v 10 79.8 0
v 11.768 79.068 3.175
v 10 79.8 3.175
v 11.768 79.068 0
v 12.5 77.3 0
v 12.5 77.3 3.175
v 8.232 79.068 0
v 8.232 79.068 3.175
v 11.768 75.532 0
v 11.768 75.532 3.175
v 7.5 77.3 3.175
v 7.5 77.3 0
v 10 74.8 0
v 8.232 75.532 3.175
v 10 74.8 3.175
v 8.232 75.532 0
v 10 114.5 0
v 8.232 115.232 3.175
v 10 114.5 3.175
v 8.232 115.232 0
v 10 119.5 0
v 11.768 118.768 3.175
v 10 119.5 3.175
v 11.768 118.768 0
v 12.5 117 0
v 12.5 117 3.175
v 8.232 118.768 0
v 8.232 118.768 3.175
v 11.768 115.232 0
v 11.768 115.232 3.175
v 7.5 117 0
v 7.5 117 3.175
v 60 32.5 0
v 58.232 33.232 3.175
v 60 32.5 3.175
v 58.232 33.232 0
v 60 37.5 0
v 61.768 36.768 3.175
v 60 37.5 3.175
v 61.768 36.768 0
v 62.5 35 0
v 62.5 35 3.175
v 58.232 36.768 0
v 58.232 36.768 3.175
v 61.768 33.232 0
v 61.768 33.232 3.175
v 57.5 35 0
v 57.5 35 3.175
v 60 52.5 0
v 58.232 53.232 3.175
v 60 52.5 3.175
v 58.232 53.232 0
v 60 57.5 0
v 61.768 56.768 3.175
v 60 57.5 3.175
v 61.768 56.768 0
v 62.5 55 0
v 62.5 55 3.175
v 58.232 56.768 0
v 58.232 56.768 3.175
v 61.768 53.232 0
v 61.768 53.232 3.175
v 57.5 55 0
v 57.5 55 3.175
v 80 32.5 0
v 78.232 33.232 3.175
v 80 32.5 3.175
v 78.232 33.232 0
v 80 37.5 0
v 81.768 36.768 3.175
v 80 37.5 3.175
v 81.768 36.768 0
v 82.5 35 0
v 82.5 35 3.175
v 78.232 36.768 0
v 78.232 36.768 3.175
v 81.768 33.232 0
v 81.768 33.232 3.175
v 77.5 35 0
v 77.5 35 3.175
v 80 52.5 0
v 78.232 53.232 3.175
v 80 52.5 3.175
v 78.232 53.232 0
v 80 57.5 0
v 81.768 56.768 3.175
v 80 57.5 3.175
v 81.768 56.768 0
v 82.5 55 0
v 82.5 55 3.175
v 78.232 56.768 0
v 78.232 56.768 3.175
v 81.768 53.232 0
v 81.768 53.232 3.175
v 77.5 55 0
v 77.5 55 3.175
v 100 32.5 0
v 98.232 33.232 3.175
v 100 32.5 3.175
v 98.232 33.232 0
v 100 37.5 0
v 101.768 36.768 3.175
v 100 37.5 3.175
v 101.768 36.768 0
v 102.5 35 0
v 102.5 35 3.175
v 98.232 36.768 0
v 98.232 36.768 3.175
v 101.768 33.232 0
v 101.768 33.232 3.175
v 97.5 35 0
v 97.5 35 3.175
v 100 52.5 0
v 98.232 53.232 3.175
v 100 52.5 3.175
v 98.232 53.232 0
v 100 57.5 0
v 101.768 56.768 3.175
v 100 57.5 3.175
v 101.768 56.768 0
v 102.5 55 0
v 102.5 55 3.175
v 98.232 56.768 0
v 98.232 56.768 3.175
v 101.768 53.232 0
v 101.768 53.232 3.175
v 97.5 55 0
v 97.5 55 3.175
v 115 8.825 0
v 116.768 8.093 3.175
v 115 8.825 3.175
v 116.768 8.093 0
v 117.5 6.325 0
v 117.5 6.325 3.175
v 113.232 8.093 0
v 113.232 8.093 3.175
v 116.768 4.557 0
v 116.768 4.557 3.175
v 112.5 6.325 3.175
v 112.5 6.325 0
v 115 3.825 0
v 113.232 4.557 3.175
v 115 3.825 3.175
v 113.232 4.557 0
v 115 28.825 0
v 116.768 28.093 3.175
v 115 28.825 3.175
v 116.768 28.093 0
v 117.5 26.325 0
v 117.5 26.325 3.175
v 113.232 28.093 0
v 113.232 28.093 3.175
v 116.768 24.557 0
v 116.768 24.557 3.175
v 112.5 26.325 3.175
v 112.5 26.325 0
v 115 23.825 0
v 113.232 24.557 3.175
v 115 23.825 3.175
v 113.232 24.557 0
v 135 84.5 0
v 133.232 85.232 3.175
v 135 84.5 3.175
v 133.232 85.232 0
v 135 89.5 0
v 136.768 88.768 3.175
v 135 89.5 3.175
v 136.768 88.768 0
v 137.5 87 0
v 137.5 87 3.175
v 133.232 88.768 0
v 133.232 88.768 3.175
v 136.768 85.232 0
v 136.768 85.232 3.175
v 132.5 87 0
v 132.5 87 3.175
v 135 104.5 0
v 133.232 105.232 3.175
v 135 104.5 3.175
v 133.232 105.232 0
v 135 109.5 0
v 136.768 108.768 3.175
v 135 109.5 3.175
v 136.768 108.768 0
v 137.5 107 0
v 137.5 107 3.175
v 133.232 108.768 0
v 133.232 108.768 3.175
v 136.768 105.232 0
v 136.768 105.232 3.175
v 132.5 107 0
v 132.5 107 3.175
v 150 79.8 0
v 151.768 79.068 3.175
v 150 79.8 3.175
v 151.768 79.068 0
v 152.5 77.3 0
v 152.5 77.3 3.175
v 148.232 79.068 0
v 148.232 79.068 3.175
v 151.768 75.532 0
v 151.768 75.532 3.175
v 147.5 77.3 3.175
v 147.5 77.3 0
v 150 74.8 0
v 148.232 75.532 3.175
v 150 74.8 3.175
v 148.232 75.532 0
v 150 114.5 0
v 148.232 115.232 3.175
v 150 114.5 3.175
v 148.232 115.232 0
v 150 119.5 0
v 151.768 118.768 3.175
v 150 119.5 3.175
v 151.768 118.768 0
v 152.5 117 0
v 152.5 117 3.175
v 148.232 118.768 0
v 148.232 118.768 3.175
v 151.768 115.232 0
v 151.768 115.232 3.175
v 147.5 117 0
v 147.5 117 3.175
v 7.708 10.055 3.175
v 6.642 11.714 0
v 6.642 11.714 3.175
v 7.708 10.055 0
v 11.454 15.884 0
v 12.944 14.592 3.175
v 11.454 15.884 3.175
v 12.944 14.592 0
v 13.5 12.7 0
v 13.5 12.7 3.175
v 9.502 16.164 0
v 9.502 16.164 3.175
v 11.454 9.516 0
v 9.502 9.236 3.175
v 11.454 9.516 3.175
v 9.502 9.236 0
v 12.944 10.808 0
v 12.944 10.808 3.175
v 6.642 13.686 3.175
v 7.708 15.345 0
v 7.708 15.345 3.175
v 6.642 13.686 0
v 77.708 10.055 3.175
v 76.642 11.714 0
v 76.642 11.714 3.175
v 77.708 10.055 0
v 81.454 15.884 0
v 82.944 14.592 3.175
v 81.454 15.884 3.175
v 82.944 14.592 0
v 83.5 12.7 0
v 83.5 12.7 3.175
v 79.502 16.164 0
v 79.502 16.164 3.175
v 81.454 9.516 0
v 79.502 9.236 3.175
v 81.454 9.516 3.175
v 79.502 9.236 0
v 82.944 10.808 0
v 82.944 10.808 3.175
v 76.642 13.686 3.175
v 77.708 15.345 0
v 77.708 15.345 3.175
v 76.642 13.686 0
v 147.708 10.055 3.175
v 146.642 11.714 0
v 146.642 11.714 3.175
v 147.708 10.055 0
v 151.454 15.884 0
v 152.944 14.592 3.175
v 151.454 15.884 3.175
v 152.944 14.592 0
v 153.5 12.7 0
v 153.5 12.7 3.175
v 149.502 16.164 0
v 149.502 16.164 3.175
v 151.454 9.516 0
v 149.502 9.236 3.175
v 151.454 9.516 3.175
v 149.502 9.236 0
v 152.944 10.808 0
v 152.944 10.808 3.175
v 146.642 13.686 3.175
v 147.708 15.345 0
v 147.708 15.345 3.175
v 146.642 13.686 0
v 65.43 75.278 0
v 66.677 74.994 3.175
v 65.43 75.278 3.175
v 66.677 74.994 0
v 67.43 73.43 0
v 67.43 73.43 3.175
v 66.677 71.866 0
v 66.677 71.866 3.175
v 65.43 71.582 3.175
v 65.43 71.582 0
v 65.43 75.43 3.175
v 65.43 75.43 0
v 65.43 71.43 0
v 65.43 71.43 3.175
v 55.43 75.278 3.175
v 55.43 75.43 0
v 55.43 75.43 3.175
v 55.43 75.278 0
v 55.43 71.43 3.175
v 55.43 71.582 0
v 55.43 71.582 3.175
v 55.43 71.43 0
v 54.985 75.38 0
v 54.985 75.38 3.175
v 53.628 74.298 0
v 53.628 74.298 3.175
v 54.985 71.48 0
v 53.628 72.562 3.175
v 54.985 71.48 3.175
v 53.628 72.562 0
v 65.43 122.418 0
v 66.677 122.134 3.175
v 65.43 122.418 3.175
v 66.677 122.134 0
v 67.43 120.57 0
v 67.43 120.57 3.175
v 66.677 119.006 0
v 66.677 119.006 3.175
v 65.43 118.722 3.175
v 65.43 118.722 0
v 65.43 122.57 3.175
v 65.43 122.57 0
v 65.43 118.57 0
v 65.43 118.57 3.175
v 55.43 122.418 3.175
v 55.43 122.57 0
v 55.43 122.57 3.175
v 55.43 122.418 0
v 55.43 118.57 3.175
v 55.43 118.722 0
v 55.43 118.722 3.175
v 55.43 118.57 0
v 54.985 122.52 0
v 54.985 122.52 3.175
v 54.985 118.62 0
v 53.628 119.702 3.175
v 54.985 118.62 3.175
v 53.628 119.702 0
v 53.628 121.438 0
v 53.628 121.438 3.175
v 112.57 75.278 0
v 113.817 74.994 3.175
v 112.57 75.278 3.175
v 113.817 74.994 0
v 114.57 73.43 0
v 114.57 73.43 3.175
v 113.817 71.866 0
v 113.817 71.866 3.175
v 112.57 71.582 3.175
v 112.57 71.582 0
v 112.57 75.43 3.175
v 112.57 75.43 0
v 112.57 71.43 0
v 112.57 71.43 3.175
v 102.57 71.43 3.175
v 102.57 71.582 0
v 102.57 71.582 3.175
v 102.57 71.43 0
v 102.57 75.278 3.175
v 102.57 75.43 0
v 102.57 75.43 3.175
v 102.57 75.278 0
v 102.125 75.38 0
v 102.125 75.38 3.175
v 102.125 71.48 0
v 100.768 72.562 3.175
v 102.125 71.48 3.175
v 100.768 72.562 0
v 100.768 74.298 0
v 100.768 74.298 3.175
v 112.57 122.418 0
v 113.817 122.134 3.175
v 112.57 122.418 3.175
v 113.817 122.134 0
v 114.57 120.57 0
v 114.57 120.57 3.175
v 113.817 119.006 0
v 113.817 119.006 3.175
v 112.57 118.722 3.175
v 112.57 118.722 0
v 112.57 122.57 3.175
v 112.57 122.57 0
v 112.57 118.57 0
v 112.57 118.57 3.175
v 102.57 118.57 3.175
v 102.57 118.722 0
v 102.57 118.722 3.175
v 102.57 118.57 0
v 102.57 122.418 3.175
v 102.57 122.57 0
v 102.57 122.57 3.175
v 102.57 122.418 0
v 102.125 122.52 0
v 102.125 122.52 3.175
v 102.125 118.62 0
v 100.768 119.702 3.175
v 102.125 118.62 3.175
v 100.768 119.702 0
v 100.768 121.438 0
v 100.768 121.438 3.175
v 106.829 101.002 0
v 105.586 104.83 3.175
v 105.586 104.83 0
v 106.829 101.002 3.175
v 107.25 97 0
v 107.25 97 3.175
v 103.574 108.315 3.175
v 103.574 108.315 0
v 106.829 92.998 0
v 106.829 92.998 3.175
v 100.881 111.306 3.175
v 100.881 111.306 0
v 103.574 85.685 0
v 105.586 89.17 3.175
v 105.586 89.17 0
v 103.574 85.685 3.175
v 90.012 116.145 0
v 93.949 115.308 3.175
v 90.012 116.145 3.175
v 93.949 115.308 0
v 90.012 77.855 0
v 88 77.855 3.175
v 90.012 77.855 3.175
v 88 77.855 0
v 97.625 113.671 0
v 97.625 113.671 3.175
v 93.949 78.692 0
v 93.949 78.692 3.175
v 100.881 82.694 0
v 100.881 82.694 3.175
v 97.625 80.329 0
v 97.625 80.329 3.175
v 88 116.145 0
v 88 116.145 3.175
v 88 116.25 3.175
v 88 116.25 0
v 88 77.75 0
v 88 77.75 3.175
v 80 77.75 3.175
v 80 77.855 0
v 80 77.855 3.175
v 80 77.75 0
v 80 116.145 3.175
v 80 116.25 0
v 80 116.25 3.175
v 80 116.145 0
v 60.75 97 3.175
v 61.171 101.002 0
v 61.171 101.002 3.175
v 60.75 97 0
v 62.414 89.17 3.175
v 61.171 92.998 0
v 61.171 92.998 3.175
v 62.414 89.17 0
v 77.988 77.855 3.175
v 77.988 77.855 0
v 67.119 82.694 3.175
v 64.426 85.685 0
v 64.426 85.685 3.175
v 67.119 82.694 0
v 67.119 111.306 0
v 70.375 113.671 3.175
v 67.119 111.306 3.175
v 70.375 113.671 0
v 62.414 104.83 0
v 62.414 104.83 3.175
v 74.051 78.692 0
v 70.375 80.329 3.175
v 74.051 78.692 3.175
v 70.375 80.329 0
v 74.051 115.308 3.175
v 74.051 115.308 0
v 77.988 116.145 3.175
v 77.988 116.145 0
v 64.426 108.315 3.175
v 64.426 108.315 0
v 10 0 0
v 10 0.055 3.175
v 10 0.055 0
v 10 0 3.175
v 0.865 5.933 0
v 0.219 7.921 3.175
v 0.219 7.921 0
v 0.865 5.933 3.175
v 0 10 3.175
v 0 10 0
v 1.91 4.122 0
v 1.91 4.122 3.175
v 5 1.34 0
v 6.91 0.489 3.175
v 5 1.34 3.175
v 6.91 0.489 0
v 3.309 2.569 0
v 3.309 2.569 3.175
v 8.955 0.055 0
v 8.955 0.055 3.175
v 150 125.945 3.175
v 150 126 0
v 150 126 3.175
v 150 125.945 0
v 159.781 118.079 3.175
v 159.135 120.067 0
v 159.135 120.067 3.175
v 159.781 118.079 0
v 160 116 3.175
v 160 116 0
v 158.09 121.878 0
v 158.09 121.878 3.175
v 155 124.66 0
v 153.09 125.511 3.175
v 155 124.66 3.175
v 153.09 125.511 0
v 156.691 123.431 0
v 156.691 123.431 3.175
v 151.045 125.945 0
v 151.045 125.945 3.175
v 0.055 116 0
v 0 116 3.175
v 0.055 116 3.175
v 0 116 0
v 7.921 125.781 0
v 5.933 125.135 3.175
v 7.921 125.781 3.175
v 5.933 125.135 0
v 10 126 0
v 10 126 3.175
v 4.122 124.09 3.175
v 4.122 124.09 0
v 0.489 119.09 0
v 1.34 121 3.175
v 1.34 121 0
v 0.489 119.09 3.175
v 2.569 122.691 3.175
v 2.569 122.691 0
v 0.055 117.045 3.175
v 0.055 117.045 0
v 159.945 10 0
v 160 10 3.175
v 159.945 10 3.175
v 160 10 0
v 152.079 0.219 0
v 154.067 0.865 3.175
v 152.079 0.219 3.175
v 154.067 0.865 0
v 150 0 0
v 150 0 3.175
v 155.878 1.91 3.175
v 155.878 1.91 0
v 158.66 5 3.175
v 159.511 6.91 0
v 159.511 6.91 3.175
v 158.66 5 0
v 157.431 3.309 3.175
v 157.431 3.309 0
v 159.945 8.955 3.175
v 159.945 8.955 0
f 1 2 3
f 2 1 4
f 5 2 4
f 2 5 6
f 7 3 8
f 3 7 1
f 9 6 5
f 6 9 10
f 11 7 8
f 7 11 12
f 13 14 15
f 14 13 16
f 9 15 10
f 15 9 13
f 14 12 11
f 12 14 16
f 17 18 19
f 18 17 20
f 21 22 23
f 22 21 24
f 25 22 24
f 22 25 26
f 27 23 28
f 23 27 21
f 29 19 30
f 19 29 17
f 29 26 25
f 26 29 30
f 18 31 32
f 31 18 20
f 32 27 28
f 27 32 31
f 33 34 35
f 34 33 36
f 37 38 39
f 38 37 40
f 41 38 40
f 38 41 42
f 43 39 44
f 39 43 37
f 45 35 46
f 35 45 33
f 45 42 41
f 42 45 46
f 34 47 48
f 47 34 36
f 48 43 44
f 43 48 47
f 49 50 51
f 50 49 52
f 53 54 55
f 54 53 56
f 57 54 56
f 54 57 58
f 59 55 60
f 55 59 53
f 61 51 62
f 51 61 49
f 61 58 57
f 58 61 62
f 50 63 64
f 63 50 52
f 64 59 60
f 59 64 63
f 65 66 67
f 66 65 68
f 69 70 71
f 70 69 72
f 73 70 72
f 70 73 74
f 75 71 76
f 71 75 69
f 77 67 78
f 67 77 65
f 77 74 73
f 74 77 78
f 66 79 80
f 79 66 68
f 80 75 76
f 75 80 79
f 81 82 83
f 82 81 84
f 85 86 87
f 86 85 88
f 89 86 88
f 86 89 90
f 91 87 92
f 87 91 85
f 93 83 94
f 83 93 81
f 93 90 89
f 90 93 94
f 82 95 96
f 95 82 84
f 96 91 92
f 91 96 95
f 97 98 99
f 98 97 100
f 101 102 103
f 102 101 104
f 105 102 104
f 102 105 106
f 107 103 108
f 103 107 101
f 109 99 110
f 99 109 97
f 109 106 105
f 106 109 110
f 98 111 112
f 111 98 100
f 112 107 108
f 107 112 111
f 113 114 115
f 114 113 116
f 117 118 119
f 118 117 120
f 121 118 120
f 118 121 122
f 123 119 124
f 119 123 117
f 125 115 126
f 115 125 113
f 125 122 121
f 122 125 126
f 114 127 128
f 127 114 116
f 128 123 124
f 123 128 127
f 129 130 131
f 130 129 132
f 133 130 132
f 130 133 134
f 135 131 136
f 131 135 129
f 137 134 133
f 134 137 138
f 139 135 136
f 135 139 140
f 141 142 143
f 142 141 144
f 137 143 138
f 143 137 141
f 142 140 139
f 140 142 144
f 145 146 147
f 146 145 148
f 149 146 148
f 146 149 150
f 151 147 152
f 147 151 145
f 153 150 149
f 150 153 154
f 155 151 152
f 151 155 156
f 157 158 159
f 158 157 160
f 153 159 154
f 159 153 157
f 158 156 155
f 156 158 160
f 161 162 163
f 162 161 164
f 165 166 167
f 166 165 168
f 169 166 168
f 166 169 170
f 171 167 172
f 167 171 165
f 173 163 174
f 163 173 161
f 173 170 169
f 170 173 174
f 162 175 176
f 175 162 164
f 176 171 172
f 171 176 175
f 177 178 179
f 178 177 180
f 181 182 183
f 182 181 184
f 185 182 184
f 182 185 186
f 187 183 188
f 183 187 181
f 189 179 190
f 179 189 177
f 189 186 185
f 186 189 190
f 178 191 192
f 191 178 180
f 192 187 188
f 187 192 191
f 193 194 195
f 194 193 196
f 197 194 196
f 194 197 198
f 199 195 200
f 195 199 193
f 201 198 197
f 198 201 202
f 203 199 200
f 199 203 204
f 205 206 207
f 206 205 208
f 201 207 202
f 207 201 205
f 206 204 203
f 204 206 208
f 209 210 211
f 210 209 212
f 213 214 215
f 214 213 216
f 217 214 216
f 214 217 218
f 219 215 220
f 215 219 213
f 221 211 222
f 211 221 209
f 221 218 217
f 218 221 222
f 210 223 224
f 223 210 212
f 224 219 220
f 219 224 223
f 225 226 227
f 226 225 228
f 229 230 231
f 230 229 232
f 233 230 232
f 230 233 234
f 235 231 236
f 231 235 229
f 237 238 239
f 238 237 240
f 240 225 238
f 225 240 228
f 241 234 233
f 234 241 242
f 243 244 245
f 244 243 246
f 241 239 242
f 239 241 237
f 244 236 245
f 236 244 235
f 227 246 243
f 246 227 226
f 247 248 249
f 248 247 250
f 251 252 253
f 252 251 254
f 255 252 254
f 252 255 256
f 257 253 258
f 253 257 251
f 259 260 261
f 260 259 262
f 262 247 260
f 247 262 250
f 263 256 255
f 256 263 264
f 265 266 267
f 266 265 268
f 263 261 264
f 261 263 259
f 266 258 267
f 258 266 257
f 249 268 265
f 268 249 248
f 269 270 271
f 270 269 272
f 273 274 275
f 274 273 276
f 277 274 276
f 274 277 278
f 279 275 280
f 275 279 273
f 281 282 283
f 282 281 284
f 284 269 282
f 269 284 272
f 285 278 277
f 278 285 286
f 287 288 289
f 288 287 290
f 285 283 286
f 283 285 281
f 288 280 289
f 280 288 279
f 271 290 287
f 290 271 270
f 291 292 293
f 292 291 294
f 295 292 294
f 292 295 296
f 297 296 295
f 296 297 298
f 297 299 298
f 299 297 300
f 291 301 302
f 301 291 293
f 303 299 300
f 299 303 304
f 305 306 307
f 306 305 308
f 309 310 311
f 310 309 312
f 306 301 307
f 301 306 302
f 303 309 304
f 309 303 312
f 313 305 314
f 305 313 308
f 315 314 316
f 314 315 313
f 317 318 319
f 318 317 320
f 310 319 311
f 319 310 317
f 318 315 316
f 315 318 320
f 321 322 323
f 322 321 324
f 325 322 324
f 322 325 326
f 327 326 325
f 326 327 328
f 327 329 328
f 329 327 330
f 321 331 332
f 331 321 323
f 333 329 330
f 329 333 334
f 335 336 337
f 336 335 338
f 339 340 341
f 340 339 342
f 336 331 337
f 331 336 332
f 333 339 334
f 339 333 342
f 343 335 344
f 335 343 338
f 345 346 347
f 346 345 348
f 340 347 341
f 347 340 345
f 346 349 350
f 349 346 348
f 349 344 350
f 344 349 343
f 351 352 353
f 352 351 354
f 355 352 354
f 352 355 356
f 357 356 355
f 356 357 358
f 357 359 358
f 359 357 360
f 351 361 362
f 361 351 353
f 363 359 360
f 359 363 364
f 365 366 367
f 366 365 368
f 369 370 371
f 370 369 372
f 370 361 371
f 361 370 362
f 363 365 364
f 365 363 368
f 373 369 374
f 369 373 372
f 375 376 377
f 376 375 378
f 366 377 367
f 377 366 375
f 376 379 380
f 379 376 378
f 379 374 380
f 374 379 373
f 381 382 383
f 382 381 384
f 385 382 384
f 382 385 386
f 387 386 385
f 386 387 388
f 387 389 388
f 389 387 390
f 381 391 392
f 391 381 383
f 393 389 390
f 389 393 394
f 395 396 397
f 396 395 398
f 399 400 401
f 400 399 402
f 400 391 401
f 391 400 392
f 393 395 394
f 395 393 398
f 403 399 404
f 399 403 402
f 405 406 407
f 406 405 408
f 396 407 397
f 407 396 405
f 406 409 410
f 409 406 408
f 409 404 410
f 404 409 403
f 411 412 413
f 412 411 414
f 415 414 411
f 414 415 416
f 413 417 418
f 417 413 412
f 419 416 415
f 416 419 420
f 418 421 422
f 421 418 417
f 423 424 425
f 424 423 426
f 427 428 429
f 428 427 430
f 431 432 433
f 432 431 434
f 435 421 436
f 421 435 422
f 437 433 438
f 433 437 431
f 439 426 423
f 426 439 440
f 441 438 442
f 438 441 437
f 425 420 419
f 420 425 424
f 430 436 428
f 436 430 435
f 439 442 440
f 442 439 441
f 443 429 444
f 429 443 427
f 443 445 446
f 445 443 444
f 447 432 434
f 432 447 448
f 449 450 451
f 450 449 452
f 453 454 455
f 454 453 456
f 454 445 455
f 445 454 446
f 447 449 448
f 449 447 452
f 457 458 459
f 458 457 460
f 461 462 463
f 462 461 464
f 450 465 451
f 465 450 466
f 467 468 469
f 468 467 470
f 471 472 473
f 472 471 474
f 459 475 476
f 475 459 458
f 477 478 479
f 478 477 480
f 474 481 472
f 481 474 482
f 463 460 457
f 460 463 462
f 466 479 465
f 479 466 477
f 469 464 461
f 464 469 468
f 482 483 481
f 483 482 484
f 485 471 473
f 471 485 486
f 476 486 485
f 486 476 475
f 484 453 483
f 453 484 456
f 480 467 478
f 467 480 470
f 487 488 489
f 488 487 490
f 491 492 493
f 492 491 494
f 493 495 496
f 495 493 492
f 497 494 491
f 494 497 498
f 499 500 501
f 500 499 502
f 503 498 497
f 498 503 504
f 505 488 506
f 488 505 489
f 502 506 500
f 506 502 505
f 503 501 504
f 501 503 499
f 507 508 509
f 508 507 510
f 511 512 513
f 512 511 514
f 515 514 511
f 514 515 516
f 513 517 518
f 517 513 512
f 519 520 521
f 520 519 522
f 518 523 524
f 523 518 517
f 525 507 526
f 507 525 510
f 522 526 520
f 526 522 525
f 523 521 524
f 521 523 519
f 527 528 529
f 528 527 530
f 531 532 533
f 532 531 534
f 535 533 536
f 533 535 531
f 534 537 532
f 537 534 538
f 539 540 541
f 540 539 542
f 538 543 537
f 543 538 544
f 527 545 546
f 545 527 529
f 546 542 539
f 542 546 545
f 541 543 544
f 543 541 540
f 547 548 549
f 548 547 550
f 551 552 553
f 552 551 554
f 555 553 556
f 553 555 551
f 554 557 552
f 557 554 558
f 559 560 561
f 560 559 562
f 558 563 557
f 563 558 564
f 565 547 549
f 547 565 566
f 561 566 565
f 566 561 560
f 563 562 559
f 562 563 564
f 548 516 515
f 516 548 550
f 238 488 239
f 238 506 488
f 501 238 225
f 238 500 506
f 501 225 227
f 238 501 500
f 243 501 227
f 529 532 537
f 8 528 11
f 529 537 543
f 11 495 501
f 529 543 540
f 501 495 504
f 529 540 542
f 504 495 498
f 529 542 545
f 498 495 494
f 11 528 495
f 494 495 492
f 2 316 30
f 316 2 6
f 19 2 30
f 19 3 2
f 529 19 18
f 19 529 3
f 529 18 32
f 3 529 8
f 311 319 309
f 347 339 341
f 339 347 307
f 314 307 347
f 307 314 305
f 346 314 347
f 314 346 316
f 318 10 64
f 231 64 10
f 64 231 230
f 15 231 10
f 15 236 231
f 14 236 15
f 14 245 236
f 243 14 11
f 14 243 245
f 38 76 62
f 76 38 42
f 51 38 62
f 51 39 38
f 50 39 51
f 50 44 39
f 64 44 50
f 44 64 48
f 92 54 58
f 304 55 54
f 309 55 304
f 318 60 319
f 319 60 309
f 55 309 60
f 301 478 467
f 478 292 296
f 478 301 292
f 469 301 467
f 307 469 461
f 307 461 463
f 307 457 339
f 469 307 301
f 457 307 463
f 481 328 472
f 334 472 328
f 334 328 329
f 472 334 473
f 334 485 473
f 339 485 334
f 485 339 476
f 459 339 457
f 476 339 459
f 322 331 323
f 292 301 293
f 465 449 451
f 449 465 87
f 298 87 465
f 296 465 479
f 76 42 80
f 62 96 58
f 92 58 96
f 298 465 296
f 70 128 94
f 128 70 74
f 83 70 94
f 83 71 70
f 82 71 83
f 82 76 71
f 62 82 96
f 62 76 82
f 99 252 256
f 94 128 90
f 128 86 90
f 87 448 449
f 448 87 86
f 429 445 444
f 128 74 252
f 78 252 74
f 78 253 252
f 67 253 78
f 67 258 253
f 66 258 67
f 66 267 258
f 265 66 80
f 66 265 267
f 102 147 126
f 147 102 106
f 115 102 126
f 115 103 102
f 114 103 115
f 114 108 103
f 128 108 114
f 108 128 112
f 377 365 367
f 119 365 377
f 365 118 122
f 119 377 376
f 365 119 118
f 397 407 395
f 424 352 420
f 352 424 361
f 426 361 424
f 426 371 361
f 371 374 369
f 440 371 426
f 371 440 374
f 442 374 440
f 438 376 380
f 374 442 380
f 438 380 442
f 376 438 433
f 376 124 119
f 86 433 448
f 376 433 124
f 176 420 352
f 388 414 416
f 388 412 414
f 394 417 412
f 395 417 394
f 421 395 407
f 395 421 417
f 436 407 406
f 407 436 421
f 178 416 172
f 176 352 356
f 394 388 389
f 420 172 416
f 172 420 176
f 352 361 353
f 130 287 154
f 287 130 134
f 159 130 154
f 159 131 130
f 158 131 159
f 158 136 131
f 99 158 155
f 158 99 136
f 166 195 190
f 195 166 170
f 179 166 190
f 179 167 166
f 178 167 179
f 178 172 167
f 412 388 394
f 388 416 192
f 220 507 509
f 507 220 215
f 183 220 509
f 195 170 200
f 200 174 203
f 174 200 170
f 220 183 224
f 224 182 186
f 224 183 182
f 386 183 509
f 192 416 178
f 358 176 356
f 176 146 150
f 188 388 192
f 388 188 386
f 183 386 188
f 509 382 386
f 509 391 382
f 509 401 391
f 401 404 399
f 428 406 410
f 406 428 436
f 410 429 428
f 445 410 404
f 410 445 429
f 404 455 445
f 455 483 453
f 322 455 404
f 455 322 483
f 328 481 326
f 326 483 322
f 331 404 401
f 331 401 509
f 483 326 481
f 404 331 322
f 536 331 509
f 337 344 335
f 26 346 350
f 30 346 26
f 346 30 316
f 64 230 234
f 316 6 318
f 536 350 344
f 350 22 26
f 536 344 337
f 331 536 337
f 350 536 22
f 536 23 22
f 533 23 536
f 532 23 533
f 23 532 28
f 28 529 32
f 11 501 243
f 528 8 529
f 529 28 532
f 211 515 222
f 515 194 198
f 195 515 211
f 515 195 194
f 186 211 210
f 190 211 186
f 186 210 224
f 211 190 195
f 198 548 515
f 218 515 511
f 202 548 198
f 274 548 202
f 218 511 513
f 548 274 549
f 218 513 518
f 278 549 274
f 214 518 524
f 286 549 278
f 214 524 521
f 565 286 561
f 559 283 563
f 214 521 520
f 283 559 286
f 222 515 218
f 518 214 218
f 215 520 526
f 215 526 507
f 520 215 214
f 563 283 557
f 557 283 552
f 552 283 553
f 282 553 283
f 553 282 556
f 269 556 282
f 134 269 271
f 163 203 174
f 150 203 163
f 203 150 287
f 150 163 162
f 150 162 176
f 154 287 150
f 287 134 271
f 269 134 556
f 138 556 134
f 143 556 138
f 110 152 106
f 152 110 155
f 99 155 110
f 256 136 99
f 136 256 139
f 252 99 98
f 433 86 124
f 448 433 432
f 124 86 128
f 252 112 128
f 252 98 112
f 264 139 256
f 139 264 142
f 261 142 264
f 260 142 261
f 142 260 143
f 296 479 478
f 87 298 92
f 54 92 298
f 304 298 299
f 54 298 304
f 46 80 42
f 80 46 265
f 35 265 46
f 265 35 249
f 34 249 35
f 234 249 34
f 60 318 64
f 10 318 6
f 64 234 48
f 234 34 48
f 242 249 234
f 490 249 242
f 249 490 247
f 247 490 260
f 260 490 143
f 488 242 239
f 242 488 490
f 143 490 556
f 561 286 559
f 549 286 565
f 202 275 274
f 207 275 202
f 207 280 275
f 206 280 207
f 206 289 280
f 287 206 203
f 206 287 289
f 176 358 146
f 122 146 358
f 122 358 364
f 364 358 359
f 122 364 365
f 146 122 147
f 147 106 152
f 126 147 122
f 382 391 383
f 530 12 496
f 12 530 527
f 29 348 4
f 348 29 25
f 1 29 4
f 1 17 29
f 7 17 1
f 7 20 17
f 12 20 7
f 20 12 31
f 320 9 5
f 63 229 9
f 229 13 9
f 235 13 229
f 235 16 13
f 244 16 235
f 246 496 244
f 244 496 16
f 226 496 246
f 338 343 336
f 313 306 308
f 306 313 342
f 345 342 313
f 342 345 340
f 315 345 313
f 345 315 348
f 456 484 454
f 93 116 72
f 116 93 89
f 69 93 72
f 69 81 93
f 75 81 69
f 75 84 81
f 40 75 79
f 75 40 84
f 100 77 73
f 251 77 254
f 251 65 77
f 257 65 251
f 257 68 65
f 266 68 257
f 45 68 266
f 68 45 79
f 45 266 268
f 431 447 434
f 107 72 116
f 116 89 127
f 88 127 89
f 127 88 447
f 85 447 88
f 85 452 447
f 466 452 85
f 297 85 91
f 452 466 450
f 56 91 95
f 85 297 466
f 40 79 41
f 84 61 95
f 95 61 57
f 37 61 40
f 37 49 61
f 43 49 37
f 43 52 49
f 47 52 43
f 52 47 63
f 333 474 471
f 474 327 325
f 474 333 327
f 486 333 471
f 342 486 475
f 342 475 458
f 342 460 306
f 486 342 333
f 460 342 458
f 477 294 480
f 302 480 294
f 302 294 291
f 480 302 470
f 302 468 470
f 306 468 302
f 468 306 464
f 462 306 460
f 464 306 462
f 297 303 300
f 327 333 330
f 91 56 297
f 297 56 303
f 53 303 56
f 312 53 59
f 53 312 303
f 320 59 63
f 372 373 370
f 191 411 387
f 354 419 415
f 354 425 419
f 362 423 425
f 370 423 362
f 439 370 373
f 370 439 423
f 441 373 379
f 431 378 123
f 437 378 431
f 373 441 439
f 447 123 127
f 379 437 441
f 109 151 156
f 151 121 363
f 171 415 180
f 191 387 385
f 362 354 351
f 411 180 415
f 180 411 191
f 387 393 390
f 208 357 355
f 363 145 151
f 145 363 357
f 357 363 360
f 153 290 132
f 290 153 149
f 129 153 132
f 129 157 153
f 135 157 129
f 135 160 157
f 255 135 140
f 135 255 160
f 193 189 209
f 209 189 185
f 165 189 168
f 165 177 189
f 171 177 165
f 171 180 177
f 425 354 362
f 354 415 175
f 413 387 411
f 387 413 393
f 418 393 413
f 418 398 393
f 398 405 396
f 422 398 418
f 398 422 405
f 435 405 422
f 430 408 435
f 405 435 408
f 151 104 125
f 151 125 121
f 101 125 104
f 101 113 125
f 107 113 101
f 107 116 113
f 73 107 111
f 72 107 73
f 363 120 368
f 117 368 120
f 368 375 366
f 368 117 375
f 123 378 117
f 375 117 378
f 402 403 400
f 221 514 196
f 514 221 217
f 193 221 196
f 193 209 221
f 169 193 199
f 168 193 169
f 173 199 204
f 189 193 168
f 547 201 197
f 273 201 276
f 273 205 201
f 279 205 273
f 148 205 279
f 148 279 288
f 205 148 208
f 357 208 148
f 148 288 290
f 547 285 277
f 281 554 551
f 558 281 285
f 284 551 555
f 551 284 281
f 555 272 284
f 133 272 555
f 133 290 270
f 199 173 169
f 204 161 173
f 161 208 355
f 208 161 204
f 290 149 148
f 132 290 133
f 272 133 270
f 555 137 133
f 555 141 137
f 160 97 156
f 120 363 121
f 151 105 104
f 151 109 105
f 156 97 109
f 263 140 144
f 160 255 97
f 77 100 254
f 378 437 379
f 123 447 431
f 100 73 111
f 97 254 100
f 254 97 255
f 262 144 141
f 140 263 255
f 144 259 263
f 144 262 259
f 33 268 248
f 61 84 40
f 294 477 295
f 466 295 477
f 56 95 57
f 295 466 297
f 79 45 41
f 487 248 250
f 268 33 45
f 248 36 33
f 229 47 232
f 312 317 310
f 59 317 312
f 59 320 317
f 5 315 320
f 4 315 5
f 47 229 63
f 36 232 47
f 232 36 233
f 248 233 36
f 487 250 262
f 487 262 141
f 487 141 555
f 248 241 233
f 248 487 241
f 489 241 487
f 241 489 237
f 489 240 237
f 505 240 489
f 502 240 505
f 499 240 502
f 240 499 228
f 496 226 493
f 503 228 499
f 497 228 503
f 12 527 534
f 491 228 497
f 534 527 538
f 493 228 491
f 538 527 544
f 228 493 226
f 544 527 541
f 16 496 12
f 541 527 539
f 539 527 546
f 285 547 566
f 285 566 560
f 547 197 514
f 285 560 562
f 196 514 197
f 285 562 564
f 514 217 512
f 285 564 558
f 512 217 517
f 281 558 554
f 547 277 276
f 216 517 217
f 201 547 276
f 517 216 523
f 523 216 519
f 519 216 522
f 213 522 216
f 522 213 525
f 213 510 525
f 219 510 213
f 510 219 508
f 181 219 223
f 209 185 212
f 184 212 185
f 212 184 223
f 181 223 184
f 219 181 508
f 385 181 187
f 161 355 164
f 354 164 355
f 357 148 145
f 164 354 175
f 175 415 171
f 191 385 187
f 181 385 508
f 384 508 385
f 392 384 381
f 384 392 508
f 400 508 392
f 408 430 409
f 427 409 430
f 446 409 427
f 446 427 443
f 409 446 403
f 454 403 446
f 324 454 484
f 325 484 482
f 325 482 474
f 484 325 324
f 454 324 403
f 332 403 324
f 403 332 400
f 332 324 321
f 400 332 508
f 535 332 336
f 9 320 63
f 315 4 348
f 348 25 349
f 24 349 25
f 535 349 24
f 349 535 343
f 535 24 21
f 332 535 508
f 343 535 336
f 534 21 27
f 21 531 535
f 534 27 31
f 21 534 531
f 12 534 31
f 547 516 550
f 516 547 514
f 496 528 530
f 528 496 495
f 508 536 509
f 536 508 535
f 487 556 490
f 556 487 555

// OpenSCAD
// MakerSlide Component
// http://www.makerslide.com
// c14006_rev_1
// Motor/Bearing Wheel Carriage Plate
// Original by Barton Dring
// OpenSCAD model by Mike Sheldrake

motor_wheel_carriage_plate();

module motor_wheel_carriage_plate(thickness=3.175) {
color([175/255,178/255,183/255])
difference() {

// 160mm by 126mm plate
// 3.175mm thick by default,
// but you can pass a different thickness to this module
cube([160,126,thickness],center=false);

// 5mm diam. holes
for(i=[
  [10,77.3],
  [10,117],
  [60,35],
  [60,55],
  [80,35],
  [80,55],
  [100,35],
  [100,55],
  [115,6.325],
  [115,26.325],
  [135,87],
  [135,107],
  [150,77.3],
  [150,117]
  ]) { translate([i[0],i[1],-0.2]) cylinder(h=thickness+1,r=5/2,center=false); }

// 7mm diam. holes
for(i=[
  [10,12.7],
  [80,12.7],
  [150,12.7]
  ]) { translate([i[0],i[1],-0.2]) cylinder(h=thickness+1,r=7/2,center=false); }

// motor mount screw slots
for(i=[
  [60.43,73.43],
  [60.43,120.57],
  [107.57,73.43],
  [107.57,120.57],
  ]) { translate([i[0],i[1],-0.2]) { 
	translate([ 5,0,0]) cylinder(h=thickness+1,r=4/2,center=false); 
	translate([ 0,0,thickness/2]) cube([10,4,thickness+1],center=true); 
	translate([-5,0,0]) cylinder(h=thickness+1,r=4/2,center=false);
	} }

// motor shaft hole
translate([84,97,-0.2]){
	translate([ (46.5 - 38.5)/2,0,0]) cylinder(h=thickness+1,r=38.5/2,center=false); 
	translate([ 0,0,thickness/2]) cube([46.5 - 38.5,38.5,thickness+1],center=true); 
	translate([-(46.5 - 38.5)/2,0,0]) cylinder(h=thickness+1,r=38.5/2,center=false);
	}

// rounded corners on plate
for(i=[
  [0,0,0],
  [160,126,180],
  [0,126,-90],
  [160,0,-270]
  ]
  ) {
	translate([i[0],i[1],0]) rotate(a=[0,0,i[2]]) translate([10,10,-0.1]) rotate(a=[0,0,180]) difference() {
		cube([11,11,thickness+1],center=false);
		translate([0,0,-0.1]) cylinder(h=thickness+2,r=10,center=false);
		}
	}
}
}
